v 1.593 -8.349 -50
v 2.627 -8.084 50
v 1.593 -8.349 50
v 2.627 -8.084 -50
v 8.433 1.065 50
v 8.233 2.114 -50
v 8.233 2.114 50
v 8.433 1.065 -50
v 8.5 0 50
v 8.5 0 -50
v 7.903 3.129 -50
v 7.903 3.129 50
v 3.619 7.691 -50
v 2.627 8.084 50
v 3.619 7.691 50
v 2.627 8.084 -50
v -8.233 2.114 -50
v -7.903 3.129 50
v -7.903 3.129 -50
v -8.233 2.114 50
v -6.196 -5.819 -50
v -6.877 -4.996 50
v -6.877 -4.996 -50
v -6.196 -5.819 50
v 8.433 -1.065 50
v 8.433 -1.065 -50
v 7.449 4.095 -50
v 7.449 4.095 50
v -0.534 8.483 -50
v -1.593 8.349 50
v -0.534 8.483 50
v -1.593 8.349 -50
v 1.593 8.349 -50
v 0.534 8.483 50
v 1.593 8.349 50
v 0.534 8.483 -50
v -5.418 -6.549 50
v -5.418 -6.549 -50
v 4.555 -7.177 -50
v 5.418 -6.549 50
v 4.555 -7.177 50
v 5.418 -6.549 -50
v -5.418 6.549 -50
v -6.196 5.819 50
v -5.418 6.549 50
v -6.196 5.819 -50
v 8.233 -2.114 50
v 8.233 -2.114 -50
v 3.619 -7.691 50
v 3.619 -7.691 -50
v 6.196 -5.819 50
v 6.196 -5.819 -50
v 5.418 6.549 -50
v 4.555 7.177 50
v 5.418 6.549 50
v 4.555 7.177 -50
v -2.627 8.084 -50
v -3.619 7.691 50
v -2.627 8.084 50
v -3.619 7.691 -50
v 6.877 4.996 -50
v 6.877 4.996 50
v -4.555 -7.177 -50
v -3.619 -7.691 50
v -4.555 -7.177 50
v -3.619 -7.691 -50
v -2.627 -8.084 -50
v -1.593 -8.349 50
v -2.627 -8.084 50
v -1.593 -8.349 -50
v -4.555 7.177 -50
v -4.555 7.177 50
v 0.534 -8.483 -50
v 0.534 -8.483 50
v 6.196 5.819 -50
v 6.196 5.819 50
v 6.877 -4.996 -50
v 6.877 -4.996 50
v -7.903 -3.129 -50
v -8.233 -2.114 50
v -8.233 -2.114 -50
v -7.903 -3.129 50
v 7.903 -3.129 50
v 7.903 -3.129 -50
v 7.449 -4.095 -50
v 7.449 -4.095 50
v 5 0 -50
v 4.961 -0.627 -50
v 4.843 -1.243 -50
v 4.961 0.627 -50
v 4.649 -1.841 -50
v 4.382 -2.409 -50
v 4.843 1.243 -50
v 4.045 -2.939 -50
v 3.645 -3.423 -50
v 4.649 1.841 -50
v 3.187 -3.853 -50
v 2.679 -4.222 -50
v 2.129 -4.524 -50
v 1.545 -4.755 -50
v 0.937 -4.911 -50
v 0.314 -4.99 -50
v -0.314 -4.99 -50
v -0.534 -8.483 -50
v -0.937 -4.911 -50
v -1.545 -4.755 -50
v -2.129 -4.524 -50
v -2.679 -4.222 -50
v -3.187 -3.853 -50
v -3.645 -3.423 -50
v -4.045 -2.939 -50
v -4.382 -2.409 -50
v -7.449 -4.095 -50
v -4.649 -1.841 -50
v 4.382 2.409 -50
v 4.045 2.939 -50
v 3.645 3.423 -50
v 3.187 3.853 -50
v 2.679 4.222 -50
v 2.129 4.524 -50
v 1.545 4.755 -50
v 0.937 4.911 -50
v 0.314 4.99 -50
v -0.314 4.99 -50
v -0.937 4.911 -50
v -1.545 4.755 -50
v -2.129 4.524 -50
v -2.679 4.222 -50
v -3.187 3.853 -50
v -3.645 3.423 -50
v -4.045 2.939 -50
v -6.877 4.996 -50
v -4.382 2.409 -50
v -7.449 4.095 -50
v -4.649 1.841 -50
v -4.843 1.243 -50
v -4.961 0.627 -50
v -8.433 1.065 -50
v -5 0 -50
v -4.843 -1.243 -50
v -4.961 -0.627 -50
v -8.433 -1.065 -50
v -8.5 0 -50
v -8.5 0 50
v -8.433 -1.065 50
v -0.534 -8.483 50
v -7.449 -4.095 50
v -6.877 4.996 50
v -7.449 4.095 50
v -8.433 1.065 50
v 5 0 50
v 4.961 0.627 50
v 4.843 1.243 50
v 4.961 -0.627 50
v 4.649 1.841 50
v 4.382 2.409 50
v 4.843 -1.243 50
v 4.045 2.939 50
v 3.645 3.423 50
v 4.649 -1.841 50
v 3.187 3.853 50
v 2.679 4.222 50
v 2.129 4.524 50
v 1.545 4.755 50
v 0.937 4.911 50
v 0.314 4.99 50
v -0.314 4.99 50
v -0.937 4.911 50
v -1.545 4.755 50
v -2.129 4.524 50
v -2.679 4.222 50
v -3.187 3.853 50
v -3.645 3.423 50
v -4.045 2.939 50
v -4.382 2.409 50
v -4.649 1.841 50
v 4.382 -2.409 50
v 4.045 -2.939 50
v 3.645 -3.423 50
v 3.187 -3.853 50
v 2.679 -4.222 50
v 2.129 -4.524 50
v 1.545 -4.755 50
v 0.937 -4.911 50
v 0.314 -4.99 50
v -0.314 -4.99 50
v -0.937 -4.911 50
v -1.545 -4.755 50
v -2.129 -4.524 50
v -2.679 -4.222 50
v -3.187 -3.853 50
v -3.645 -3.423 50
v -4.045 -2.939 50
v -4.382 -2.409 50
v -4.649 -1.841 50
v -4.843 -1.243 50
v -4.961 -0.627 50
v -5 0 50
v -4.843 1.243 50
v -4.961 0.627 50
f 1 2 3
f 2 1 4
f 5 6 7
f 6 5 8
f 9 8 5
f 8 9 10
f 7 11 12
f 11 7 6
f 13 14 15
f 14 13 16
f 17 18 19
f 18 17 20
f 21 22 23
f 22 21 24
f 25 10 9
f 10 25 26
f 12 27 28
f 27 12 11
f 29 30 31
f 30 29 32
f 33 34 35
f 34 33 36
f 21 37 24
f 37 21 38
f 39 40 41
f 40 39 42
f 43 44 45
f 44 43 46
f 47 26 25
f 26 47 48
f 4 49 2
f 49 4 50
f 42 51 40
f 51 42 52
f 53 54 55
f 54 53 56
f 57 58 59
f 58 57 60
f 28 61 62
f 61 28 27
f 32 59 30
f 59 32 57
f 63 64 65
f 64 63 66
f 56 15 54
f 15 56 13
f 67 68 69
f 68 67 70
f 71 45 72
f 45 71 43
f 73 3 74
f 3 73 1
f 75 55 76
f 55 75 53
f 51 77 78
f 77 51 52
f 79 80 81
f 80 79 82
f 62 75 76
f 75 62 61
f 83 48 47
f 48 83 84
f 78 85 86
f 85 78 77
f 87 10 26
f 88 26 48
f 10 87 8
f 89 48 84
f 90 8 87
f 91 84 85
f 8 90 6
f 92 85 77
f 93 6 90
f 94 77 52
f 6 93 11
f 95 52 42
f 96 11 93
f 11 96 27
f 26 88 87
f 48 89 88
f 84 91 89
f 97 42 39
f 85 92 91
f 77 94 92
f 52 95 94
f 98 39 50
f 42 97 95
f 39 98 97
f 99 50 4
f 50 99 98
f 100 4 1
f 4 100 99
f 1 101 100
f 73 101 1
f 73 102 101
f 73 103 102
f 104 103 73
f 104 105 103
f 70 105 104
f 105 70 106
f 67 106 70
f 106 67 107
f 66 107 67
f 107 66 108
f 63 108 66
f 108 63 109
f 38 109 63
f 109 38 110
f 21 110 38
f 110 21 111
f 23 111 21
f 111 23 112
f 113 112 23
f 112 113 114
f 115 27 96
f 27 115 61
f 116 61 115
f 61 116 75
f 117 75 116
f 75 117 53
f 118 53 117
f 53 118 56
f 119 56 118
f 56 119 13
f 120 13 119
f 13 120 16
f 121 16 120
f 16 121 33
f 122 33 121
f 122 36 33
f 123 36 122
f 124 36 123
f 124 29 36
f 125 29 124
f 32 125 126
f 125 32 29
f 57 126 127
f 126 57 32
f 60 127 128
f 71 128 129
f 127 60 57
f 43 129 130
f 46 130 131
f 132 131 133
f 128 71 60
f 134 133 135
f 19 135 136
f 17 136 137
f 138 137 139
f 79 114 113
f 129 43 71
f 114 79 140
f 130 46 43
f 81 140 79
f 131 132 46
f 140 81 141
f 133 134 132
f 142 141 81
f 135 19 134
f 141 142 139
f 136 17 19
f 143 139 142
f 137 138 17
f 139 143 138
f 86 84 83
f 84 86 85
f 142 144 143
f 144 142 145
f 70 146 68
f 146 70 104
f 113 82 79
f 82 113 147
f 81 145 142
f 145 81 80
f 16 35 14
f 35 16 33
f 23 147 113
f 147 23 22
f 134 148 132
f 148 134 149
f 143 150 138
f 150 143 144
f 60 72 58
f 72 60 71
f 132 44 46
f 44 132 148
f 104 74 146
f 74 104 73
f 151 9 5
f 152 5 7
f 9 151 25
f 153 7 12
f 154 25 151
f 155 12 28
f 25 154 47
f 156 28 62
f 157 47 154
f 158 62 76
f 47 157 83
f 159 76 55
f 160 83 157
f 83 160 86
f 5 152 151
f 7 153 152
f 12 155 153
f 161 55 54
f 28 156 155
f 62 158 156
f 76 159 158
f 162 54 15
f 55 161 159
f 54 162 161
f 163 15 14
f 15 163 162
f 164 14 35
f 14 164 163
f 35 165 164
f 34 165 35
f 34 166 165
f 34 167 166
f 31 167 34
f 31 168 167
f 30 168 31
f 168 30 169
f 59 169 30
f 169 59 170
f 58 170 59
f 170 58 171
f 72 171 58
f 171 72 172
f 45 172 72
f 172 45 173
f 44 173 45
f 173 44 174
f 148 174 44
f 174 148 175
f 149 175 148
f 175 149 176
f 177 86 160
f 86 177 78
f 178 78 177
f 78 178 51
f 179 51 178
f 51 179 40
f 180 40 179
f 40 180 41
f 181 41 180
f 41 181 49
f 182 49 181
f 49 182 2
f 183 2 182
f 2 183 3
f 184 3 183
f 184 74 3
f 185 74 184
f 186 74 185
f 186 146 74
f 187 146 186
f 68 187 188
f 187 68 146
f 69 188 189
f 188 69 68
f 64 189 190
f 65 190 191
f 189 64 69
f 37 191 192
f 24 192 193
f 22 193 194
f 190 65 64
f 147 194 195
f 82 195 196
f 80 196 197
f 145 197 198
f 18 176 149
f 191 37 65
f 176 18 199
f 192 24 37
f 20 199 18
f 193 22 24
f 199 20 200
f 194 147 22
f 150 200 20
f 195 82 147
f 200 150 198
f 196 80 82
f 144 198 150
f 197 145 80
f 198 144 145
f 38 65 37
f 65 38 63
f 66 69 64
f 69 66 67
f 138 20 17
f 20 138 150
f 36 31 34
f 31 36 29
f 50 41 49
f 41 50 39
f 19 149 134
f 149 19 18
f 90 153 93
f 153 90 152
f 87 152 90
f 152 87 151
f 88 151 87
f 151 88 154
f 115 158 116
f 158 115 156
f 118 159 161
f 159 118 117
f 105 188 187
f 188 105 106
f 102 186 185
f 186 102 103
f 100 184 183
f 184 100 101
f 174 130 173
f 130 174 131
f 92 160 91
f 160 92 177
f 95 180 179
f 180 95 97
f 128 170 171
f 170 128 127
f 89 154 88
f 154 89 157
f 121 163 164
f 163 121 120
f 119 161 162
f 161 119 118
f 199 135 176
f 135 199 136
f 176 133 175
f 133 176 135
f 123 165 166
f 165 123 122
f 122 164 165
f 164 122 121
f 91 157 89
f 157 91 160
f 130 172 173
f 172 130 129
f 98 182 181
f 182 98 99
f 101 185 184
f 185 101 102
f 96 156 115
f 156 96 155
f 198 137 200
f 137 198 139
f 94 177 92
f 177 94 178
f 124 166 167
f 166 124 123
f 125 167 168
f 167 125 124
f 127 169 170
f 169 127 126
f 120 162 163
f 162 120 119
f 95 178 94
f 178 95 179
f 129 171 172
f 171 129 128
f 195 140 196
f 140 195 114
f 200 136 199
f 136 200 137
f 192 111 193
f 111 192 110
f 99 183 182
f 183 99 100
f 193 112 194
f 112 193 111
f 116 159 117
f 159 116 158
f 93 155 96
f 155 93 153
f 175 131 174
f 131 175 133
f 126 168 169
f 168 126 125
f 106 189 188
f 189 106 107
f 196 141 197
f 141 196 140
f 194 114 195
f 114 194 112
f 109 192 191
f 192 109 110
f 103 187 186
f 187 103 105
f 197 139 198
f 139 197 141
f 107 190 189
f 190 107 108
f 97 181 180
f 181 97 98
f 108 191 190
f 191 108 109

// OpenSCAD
$fn = 50;


difference() {
	union() {
		translate(v = [0, 0, -50.0000000000]) {
			cylinder(h = 100, r = 8.5000000000);
		}
	}
	union() {
		translate(v = [0, 0, -100.0000000000]) {
			cylinder(h = 200, r = 5.0000000000);
		}
	}
}
